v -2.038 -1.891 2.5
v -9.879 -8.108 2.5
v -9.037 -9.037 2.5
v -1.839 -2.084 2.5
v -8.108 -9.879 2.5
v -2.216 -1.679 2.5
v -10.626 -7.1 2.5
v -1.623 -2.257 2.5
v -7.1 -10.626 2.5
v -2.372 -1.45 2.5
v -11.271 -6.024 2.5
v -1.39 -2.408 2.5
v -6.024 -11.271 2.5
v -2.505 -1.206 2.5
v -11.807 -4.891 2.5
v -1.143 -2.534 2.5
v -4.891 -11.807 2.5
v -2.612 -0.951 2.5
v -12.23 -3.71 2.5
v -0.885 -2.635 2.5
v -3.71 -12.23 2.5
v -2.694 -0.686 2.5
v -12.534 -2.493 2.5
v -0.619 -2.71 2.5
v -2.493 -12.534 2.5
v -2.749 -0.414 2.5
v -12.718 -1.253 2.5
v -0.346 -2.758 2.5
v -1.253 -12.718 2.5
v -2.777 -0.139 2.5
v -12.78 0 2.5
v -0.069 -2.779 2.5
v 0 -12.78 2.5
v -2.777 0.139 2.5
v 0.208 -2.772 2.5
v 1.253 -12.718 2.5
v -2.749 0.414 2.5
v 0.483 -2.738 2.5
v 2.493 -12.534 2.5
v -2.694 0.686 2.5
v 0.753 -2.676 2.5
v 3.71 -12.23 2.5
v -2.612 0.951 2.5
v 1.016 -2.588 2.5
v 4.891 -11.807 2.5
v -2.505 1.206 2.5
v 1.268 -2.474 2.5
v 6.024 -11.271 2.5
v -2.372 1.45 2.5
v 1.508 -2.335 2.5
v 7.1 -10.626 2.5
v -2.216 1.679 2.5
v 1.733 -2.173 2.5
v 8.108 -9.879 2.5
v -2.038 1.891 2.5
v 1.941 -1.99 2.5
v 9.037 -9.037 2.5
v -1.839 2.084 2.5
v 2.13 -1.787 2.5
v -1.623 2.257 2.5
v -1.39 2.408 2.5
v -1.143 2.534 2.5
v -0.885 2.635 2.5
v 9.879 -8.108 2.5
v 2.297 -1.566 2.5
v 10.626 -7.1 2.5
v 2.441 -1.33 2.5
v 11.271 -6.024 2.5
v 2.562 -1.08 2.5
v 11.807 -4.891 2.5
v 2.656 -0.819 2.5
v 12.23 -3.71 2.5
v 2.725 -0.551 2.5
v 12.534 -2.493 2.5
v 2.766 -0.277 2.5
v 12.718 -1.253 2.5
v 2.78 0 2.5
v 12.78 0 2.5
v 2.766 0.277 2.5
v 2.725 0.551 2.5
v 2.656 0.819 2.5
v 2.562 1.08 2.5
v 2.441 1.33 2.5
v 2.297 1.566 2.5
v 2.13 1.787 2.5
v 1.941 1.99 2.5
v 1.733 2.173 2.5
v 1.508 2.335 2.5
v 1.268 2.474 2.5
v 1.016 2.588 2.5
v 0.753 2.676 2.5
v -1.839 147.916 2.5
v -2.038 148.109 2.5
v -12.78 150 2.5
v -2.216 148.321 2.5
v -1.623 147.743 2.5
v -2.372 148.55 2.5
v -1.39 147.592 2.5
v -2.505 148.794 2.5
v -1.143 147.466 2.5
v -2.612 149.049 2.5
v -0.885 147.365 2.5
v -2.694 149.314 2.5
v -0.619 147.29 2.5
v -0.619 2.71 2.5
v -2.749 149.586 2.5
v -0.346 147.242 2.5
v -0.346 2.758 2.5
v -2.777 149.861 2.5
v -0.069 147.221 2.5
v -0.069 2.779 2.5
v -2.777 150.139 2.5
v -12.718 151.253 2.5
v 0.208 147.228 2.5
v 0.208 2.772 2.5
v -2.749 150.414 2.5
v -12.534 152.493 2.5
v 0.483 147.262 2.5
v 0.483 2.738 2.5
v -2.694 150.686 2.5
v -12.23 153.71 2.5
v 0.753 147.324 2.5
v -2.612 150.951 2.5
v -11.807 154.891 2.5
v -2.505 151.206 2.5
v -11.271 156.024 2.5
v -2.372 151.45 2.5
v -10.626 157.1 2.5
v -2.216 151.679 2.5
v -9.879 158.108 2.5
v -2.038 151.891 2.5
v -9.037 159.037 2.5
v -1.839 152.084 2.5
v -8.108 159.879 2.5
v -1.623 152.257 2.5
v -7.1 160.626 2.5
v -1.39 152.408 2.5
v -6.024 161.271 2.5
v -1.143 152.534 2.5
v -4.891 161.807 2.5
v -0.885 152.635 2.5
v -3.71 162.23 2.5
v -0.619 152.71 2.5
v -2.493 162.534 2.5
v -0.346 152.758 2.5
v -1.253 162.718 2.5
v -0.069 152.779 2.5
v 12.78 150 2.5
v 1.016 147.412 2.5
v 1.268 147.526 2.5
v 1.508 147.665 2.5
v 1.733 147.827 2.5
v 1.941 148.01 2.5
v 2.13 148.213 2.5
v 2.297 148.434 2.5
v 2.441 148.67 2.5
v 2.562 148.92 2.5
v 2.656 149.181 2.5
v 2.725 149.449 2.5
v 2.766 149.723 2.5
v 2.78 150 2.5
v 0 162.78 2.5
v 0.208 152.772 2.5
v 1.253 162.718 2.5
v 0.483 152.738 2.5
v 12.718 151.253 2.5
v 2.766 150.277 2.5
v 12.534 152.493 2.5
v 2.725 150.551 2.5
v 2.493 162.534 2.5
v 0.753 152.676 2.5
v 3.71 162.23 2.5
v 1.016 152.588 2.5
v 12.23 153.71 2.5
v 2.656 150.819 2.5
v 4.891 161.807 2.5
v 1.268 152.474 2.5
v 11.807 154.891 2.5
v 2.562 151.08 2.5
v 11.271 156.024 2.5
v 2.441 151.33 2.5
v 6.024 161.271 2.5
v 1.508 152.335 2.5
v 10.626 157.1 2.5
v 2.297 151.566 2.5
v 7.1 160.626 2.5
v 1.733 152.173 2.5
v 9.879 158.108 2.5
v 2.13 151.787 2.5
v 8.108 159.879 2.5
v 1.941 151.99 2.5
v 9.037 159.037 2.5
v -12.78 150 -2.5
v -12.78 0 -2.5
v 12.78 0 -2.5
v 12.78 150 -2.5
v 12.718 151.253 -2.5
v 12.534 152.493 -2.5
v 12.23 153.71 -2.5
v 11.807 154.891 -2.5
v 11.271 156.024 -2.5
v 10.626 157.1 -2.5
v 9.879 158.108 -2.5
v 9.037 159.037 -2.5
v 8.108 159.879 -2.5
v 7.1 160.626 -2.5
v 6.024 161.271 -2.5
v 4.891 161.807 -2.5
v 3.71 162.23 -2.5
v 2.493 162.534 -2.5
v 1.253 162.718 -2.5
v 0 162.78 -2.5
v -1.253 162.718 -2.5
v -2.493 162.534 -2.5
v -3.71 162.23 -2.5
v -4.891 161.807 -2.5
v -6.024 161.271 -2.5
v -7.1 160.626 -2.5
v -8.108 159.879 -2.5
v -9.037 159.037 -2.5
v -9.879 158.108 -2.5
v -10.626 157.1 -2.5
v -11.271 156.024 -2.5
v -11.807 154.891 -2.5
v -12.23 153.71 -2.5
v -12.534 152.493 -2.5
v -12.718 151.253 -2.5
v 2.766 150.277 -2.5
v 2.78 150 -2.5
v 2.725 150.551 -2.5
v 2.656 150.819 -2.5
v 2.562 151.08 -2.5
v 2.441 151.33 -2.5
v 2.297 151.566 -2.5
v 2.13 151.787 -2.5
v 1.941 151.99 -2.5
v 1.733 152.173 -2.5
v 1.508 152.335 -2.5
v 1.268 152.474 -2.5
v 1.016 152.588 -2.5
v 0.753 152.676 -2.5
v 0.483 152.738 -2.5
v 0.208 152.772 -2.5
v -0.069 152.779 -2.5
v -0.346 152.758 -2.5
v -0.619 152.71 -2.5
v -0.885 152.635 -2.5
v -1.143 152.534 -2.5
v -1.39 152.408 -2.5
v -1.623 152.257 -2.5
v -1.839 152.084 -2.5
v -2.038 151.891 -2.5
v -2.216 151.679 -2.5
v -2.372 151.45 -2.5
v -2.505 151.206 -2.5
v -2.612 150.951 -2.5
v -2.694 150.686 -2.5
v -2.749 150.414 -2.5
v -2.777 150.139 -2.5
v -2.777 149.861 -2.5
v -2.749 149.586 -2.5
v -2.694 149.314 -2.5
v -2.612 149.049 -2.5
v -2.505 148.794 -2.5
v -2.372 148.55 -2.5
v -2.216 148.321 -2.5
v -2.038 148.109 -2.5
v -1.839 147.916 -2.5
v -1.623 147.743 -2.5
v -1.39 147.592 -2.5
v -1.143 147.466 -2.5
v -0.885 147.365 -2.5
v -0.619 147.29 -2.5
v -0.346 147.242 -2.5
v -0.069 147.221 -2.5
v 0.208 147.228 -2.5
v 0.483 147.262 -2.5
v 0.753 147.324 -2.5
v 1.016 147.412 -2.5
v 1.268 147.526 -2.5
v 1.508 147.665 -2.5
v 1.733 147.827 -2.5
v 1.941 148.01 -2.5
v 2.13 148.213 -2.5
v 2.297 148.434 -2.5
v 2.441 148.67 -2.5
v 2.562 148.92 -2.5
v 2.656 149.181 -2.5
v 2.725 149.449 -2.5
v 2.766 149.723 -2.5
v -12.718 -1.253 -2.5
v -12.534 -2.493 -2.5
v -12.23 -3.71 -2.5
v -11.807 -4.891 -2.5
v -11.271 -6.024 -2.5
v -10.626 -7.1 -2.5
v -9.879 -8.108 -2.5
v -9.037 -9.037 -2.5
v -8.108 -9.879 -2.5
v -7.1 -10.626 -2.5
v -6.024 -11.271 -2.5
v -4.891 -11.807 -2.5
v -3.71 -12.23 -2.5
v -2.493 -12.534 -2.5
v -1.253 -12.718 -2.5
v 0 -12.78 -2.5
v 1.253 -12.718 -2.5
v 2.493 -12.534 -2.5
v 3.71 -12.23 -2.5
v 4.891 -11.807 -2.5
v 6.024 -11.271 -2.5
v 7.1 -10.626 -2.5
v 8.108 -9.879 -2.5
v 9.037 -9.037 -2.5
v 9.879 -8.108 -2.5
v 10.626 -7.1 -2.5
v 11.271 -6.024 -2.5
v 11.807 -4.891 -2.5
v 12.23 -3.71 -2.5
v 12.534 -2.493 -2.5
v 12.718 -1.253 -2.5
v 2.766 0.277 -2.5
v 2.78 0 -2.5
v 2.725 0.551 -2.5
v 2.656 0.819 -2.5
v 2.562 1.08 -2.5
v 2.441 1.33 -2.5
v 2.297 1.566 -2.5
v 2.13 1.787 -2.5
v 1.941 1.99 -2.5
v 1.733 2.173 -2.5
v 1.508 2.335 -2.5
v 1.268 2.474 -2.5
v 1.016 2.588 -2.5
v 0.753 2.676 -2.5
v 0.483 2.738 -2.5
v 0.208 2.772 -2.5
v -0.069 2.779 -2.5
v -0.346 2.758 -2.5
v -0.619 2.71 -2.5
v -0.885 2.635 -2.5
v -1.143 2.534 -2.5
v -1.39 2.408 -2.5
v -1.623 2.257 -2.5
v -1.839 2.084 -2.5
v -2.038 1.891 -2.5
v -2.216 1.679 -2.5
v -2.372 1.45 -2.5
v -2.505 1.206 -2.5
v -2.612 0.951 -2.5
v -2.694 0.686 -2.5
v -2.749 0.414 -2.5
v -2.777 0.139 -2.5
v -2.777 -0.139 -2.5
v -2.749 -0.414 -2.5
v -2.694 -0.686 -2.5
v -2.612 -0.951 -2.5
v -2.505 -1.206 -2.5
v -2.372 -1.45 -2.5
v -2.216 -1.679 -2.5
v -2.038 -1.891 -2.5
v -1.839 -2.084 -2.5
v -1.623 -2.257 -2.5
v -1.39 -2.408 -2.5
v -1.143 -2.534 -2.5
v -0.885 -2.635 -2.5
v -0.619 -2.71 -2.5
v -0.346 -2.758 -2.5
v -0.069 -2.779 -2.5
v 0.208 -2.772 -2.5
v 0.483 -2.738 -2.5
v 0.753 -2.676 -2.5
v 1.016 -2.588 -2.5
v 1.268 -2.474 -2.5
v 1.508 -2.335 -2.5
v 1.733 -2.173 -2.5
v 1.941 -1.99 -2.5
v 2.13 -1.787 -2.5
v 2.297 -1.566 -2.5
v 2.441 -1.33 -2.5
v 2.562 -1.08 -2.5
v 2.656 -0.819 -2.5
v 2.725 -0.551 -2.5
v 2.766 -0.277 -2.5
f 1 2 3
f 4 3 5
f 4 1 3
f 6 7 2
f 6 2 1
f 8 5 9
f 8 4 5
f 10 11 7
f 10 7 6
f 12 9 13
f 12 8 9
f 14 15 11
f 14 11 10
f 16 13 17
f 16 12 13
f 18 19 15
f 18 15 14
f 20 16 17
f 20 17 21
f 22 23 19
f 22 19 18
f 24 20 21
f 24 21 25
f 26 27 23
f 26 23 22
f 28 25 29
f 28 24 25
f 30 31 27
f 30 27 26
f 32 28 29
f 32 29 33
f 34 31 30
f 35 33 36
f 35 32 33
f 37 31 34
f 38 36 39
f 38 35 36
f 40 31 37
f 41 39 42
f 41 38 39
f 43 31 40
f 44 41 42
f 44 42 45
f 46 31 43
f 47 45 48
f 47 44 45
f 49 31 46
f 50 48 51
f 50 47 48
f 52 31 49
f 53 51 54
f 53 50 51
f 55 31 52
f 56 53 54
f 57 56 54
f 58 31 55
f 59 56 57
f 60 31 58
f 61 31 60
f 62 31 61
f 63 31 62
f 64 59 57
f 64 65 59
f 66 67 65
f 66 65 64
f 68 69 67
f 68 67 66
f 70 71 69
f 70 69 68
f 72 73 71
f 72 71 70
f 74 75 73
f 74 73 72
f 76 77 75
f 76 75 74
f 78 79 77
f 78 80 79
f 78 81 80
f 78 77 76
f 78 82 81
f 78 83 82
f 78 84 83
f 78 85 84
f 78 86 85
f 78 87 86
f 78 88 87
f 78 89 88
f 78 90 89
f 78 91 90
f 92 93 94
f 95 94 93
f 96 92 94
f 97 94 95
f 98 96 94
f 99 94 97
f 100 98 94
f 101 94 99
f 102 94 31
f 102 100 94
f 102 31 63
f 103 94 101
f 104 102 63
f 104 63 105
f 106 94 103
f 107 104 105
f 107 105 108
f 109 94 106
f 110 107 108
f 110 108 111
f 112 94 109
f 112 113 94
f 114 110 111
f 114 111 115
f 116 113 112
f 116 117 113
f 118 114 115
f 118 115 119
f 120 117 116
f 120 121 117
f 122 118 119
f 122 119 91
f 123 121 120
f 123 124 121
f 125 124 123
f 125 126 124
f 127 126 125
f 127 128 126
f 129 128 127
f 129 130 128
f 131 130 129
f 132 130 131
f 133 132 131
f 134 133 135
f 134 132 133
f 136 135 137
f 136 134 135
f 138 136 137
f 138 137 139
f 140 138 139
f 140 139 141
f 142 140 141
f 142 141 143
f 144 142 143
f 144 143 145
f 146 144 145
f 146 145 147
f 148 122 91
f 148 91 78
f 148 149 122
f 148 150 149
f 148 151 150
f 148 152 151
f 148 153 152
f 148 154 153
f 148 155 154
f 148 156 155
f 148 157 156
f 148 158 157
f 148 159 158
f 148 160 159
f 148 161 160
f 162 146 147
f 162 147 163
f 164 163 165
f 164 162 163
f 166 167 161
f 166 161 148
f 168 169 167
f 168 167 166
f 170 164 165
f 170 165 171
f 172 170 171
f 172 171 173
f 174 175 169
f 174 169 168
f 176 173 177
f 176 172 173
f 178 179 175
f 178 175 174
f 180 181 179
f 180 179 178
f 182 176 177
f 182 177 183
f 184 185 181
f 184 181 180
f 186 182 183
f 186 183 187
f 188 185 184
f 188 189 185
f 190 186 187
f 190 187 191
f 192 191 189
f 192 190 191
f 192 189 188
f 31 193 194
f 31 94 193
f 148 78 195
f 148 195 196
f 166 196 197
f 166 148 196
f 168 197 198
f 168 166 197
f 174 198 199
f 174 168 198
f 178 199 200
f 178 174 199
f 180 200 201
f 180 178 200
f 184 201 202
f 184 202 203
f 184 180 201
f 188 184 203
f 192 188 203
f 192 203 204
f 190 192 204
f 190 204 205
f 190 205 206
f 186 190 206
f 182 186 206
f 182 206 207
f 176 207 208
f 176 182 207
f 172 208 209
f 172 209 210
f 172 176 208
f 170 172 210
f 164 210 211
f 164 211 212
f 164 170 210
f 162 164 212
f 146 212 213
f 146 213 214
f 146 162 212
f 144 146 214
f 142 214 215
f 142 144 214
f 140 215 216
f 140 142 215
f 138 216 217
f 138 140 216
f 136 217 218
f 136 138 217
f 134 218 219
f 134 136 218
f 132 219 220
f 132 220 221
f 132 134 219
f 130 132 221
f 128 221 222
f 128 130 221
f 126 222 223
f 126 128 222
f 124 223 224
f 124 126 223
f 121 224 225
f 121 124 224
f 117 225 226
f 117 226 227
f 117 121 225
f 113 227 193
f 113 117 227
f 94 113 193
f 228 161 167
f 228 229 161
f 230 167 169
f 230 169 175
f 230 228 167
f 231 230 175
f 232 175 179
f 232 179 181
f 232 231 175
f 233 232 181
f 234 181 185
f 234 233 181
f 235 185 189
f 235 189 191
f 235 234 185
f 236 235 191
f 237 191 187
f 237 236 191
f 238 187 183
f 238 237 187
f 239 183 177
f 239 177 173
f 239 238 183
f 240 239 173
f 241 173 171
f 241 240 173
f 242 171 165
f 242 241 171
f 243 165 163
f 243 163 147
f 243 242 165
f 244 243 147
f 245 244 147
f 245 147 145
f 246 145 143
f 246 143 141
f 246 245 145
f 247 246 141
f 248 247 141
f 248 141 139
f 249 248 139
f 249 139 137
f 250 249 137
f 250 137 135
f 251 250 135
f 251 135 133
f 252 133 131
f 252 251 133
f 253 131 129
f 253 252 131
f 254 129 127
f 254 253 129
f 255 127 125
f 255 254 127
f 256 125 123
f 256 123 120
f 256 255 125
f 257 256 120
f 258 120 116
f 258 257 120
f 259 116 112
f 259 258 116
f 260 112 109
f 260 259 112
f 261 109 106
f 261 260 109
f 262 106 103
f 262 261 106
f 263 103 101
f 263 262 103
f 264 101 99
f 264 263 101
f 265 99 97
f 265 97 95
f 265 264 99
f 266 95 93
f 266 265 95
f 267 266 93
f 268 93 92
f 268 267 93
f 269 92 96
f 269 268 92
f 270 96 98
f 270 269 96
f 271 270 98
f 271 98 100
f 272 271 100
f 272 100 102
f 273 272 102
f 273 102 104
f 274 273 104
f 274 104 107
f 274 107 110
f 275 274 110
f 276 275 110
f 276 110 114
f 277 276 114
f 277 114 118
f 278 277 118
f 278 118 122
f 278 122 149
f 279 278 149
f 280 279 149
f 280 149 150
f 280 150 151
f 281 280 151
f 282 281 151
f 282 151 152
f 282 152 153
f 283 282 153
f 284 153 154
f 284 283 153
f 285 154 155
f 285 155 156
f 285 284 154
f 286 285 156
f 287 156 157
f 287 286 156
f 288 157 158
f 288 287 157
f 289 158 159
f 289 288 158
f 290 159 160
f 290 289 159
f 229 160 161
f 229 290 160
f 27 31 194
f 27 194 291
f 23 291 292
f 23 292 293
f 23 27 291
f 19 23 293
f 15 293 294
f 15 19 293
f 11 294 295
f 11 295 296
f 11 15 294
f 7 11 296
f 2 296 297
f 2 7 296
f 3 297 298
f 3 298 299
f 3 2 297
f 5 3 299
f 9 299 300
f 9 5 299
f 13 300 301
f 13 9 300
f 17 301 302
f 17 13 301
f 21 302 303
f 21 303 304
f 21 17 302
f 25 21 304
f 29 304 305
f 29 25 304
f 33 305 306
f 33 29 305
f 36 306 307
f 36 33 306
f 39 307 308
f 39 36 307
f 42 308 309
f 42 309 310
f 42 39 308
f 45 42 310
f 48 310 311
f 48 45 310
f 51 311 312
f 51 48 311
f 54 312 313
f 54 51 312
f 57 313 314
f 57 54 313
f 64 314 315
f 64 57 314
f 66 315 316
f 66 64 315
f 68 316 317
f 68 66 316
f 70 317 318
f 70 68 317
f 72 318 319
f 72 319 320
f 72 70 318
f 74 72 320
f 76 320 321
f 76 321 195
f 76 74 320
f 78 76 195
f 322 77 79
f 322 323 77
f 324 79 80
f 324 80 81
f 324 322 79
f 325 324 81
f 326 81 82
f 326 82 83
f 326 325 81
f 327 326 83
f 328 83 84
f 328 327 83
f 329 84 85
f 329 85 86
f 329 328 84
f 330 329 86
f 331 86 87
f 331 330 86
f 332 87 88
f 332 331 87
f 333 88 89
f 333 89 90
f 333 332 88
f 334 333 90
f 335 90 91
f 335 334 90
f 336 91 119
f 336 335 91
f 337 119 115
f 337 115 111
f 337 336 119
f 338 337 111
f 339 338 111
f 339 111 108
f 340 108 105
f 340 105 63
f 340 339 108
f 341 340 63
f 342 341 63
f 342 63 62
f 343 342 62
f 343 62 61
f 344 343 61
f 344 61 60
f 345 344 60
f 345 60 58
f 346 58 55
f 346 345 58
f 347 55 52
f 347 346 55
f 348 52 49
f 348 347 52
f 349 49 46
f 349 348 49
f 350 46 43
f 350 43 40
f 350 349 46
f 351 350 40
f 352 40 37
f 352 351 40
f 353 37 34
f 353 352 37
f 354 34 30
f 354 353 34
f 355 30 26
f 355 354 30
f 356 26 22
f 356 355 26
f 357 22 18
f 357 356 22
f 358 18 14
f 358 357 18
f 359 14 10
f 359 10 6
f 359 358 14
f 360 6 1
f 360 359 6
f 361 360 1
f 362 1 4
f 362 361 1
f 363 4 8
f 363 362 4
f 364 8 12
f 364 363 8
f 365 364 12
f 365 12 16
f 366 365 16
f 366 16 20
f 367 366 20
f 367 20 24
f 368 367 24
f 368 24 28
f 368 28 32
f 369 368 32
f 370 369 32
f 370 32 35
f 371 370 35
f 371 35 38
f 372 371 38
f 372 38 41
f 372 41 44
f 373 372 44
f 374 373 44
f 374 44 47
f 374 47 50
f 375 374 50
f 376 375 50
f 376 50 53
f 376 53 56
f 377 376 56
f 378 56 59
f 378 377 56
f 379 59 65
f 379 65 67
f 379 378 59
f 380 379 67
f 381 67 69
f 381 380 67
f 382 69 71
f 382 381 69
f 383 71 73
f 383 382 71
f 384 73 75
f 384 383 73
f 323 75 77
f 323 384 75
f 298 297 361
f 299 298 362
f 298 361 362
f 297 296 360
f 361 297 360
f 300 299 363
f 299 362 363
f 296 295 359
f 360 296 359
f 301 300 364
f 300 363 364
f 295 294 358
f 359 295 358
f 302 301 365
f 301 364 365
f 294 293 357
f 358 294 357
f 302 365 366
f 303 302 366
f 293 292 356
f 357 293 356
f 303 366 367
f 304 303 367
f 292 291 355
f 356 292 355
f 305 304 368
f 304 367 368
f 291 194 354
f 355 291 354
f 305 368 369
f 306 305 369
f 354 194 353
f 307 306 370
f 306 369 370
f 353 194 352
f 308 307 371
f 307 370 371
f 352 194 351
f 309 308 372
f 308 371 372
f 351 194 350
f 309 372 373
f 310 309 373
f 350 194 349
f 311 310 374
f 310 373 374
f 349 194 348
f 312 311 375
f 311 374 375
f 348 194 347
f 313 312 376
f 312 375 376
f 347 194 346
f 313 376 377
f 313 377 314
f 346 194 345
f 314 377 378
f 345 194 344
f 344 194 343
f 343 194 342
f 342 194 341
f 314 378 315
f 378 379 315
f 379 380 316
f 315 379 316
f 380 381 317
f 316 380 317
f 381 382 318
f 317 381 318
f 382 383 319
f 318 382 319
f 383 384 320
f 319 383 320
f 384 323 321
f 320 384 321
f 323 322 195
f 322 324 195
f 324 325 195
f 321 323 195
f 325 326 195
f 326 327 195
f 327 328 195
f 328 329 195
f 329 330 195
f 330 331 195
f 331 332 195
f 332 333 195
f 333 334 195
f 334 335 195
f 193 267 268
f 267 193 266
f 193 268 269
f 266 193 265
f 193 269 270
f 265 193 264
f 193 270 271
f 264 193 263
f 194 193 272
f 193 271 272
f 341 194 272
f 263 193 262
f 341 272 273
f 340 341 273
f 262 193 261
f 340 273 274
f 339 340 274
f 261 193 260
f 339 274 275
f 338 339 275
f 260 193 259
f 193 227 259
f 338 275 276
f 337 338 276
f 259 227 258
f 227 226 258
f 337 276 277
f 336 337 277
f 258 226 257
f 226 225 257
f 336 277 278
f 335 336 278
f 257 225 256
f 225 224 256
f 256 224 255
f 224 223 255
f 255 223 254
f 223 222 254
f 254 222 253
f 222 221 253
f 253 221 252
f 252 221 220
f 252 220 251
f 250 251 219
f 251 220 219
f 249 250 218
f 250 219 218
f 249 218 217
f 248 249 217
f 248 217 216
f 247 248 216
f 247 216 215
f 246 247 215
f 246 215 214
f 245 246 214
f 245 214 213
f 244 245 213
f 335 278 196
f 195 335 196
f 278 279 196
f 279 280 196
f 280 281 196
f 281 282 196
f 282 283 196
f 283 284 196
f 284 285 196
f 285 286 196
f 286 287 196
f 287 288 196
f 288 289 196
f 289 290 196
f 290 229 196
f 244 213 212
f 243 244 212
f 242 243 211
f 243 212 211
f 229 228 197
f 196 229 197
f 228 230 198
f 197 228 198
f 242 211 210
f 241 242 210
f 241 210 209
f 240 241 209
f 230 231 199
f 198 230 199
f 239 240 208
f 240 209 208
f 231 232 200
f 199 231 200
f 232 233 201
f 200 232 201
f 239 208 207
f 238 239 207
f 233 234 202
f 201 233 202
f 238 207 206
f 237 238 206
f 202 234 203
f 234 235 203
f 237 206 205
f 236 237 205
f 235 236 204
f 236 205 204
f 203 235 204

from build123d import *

# Parameters (mm, degrees)
SKETCH1_R           = 12.78
SKETCH1_R_2         = 2.78
BOSS_EXTRUDE1_DEPTH = 2.5


with BuildPart() as part:
    # Sketch1 → Boss-Extrude1 (new body, symmetric)
    with BuildSketch(Plane.XY):
        with BuildLine():
            ThreePointArc((12.78, 150), (0, 137.22), (-12.78, 150))
            Line((-12.78, 150), (-12.78, 0))
            ThreePointArc((-12.78, 0), (0, 12.78), (12.78, 0))
            Line((12.78, 0), (12.78, 150))
        make_face()
        with Locations((0, 150)):
            Circle(SKETCH1_R)
        with Locations((0, 150)):
            Circle(SKETCH1_R_2, mode=Mode.SUBTRACT)
        Circle(SKETCH1_R)
        Circle(SKETCH1_R_2, mode=Mode.SUBTRACT)
    extrude(amount=BOSS_EXTRUDE1_DEPTH, both=True)


solid = part.part
